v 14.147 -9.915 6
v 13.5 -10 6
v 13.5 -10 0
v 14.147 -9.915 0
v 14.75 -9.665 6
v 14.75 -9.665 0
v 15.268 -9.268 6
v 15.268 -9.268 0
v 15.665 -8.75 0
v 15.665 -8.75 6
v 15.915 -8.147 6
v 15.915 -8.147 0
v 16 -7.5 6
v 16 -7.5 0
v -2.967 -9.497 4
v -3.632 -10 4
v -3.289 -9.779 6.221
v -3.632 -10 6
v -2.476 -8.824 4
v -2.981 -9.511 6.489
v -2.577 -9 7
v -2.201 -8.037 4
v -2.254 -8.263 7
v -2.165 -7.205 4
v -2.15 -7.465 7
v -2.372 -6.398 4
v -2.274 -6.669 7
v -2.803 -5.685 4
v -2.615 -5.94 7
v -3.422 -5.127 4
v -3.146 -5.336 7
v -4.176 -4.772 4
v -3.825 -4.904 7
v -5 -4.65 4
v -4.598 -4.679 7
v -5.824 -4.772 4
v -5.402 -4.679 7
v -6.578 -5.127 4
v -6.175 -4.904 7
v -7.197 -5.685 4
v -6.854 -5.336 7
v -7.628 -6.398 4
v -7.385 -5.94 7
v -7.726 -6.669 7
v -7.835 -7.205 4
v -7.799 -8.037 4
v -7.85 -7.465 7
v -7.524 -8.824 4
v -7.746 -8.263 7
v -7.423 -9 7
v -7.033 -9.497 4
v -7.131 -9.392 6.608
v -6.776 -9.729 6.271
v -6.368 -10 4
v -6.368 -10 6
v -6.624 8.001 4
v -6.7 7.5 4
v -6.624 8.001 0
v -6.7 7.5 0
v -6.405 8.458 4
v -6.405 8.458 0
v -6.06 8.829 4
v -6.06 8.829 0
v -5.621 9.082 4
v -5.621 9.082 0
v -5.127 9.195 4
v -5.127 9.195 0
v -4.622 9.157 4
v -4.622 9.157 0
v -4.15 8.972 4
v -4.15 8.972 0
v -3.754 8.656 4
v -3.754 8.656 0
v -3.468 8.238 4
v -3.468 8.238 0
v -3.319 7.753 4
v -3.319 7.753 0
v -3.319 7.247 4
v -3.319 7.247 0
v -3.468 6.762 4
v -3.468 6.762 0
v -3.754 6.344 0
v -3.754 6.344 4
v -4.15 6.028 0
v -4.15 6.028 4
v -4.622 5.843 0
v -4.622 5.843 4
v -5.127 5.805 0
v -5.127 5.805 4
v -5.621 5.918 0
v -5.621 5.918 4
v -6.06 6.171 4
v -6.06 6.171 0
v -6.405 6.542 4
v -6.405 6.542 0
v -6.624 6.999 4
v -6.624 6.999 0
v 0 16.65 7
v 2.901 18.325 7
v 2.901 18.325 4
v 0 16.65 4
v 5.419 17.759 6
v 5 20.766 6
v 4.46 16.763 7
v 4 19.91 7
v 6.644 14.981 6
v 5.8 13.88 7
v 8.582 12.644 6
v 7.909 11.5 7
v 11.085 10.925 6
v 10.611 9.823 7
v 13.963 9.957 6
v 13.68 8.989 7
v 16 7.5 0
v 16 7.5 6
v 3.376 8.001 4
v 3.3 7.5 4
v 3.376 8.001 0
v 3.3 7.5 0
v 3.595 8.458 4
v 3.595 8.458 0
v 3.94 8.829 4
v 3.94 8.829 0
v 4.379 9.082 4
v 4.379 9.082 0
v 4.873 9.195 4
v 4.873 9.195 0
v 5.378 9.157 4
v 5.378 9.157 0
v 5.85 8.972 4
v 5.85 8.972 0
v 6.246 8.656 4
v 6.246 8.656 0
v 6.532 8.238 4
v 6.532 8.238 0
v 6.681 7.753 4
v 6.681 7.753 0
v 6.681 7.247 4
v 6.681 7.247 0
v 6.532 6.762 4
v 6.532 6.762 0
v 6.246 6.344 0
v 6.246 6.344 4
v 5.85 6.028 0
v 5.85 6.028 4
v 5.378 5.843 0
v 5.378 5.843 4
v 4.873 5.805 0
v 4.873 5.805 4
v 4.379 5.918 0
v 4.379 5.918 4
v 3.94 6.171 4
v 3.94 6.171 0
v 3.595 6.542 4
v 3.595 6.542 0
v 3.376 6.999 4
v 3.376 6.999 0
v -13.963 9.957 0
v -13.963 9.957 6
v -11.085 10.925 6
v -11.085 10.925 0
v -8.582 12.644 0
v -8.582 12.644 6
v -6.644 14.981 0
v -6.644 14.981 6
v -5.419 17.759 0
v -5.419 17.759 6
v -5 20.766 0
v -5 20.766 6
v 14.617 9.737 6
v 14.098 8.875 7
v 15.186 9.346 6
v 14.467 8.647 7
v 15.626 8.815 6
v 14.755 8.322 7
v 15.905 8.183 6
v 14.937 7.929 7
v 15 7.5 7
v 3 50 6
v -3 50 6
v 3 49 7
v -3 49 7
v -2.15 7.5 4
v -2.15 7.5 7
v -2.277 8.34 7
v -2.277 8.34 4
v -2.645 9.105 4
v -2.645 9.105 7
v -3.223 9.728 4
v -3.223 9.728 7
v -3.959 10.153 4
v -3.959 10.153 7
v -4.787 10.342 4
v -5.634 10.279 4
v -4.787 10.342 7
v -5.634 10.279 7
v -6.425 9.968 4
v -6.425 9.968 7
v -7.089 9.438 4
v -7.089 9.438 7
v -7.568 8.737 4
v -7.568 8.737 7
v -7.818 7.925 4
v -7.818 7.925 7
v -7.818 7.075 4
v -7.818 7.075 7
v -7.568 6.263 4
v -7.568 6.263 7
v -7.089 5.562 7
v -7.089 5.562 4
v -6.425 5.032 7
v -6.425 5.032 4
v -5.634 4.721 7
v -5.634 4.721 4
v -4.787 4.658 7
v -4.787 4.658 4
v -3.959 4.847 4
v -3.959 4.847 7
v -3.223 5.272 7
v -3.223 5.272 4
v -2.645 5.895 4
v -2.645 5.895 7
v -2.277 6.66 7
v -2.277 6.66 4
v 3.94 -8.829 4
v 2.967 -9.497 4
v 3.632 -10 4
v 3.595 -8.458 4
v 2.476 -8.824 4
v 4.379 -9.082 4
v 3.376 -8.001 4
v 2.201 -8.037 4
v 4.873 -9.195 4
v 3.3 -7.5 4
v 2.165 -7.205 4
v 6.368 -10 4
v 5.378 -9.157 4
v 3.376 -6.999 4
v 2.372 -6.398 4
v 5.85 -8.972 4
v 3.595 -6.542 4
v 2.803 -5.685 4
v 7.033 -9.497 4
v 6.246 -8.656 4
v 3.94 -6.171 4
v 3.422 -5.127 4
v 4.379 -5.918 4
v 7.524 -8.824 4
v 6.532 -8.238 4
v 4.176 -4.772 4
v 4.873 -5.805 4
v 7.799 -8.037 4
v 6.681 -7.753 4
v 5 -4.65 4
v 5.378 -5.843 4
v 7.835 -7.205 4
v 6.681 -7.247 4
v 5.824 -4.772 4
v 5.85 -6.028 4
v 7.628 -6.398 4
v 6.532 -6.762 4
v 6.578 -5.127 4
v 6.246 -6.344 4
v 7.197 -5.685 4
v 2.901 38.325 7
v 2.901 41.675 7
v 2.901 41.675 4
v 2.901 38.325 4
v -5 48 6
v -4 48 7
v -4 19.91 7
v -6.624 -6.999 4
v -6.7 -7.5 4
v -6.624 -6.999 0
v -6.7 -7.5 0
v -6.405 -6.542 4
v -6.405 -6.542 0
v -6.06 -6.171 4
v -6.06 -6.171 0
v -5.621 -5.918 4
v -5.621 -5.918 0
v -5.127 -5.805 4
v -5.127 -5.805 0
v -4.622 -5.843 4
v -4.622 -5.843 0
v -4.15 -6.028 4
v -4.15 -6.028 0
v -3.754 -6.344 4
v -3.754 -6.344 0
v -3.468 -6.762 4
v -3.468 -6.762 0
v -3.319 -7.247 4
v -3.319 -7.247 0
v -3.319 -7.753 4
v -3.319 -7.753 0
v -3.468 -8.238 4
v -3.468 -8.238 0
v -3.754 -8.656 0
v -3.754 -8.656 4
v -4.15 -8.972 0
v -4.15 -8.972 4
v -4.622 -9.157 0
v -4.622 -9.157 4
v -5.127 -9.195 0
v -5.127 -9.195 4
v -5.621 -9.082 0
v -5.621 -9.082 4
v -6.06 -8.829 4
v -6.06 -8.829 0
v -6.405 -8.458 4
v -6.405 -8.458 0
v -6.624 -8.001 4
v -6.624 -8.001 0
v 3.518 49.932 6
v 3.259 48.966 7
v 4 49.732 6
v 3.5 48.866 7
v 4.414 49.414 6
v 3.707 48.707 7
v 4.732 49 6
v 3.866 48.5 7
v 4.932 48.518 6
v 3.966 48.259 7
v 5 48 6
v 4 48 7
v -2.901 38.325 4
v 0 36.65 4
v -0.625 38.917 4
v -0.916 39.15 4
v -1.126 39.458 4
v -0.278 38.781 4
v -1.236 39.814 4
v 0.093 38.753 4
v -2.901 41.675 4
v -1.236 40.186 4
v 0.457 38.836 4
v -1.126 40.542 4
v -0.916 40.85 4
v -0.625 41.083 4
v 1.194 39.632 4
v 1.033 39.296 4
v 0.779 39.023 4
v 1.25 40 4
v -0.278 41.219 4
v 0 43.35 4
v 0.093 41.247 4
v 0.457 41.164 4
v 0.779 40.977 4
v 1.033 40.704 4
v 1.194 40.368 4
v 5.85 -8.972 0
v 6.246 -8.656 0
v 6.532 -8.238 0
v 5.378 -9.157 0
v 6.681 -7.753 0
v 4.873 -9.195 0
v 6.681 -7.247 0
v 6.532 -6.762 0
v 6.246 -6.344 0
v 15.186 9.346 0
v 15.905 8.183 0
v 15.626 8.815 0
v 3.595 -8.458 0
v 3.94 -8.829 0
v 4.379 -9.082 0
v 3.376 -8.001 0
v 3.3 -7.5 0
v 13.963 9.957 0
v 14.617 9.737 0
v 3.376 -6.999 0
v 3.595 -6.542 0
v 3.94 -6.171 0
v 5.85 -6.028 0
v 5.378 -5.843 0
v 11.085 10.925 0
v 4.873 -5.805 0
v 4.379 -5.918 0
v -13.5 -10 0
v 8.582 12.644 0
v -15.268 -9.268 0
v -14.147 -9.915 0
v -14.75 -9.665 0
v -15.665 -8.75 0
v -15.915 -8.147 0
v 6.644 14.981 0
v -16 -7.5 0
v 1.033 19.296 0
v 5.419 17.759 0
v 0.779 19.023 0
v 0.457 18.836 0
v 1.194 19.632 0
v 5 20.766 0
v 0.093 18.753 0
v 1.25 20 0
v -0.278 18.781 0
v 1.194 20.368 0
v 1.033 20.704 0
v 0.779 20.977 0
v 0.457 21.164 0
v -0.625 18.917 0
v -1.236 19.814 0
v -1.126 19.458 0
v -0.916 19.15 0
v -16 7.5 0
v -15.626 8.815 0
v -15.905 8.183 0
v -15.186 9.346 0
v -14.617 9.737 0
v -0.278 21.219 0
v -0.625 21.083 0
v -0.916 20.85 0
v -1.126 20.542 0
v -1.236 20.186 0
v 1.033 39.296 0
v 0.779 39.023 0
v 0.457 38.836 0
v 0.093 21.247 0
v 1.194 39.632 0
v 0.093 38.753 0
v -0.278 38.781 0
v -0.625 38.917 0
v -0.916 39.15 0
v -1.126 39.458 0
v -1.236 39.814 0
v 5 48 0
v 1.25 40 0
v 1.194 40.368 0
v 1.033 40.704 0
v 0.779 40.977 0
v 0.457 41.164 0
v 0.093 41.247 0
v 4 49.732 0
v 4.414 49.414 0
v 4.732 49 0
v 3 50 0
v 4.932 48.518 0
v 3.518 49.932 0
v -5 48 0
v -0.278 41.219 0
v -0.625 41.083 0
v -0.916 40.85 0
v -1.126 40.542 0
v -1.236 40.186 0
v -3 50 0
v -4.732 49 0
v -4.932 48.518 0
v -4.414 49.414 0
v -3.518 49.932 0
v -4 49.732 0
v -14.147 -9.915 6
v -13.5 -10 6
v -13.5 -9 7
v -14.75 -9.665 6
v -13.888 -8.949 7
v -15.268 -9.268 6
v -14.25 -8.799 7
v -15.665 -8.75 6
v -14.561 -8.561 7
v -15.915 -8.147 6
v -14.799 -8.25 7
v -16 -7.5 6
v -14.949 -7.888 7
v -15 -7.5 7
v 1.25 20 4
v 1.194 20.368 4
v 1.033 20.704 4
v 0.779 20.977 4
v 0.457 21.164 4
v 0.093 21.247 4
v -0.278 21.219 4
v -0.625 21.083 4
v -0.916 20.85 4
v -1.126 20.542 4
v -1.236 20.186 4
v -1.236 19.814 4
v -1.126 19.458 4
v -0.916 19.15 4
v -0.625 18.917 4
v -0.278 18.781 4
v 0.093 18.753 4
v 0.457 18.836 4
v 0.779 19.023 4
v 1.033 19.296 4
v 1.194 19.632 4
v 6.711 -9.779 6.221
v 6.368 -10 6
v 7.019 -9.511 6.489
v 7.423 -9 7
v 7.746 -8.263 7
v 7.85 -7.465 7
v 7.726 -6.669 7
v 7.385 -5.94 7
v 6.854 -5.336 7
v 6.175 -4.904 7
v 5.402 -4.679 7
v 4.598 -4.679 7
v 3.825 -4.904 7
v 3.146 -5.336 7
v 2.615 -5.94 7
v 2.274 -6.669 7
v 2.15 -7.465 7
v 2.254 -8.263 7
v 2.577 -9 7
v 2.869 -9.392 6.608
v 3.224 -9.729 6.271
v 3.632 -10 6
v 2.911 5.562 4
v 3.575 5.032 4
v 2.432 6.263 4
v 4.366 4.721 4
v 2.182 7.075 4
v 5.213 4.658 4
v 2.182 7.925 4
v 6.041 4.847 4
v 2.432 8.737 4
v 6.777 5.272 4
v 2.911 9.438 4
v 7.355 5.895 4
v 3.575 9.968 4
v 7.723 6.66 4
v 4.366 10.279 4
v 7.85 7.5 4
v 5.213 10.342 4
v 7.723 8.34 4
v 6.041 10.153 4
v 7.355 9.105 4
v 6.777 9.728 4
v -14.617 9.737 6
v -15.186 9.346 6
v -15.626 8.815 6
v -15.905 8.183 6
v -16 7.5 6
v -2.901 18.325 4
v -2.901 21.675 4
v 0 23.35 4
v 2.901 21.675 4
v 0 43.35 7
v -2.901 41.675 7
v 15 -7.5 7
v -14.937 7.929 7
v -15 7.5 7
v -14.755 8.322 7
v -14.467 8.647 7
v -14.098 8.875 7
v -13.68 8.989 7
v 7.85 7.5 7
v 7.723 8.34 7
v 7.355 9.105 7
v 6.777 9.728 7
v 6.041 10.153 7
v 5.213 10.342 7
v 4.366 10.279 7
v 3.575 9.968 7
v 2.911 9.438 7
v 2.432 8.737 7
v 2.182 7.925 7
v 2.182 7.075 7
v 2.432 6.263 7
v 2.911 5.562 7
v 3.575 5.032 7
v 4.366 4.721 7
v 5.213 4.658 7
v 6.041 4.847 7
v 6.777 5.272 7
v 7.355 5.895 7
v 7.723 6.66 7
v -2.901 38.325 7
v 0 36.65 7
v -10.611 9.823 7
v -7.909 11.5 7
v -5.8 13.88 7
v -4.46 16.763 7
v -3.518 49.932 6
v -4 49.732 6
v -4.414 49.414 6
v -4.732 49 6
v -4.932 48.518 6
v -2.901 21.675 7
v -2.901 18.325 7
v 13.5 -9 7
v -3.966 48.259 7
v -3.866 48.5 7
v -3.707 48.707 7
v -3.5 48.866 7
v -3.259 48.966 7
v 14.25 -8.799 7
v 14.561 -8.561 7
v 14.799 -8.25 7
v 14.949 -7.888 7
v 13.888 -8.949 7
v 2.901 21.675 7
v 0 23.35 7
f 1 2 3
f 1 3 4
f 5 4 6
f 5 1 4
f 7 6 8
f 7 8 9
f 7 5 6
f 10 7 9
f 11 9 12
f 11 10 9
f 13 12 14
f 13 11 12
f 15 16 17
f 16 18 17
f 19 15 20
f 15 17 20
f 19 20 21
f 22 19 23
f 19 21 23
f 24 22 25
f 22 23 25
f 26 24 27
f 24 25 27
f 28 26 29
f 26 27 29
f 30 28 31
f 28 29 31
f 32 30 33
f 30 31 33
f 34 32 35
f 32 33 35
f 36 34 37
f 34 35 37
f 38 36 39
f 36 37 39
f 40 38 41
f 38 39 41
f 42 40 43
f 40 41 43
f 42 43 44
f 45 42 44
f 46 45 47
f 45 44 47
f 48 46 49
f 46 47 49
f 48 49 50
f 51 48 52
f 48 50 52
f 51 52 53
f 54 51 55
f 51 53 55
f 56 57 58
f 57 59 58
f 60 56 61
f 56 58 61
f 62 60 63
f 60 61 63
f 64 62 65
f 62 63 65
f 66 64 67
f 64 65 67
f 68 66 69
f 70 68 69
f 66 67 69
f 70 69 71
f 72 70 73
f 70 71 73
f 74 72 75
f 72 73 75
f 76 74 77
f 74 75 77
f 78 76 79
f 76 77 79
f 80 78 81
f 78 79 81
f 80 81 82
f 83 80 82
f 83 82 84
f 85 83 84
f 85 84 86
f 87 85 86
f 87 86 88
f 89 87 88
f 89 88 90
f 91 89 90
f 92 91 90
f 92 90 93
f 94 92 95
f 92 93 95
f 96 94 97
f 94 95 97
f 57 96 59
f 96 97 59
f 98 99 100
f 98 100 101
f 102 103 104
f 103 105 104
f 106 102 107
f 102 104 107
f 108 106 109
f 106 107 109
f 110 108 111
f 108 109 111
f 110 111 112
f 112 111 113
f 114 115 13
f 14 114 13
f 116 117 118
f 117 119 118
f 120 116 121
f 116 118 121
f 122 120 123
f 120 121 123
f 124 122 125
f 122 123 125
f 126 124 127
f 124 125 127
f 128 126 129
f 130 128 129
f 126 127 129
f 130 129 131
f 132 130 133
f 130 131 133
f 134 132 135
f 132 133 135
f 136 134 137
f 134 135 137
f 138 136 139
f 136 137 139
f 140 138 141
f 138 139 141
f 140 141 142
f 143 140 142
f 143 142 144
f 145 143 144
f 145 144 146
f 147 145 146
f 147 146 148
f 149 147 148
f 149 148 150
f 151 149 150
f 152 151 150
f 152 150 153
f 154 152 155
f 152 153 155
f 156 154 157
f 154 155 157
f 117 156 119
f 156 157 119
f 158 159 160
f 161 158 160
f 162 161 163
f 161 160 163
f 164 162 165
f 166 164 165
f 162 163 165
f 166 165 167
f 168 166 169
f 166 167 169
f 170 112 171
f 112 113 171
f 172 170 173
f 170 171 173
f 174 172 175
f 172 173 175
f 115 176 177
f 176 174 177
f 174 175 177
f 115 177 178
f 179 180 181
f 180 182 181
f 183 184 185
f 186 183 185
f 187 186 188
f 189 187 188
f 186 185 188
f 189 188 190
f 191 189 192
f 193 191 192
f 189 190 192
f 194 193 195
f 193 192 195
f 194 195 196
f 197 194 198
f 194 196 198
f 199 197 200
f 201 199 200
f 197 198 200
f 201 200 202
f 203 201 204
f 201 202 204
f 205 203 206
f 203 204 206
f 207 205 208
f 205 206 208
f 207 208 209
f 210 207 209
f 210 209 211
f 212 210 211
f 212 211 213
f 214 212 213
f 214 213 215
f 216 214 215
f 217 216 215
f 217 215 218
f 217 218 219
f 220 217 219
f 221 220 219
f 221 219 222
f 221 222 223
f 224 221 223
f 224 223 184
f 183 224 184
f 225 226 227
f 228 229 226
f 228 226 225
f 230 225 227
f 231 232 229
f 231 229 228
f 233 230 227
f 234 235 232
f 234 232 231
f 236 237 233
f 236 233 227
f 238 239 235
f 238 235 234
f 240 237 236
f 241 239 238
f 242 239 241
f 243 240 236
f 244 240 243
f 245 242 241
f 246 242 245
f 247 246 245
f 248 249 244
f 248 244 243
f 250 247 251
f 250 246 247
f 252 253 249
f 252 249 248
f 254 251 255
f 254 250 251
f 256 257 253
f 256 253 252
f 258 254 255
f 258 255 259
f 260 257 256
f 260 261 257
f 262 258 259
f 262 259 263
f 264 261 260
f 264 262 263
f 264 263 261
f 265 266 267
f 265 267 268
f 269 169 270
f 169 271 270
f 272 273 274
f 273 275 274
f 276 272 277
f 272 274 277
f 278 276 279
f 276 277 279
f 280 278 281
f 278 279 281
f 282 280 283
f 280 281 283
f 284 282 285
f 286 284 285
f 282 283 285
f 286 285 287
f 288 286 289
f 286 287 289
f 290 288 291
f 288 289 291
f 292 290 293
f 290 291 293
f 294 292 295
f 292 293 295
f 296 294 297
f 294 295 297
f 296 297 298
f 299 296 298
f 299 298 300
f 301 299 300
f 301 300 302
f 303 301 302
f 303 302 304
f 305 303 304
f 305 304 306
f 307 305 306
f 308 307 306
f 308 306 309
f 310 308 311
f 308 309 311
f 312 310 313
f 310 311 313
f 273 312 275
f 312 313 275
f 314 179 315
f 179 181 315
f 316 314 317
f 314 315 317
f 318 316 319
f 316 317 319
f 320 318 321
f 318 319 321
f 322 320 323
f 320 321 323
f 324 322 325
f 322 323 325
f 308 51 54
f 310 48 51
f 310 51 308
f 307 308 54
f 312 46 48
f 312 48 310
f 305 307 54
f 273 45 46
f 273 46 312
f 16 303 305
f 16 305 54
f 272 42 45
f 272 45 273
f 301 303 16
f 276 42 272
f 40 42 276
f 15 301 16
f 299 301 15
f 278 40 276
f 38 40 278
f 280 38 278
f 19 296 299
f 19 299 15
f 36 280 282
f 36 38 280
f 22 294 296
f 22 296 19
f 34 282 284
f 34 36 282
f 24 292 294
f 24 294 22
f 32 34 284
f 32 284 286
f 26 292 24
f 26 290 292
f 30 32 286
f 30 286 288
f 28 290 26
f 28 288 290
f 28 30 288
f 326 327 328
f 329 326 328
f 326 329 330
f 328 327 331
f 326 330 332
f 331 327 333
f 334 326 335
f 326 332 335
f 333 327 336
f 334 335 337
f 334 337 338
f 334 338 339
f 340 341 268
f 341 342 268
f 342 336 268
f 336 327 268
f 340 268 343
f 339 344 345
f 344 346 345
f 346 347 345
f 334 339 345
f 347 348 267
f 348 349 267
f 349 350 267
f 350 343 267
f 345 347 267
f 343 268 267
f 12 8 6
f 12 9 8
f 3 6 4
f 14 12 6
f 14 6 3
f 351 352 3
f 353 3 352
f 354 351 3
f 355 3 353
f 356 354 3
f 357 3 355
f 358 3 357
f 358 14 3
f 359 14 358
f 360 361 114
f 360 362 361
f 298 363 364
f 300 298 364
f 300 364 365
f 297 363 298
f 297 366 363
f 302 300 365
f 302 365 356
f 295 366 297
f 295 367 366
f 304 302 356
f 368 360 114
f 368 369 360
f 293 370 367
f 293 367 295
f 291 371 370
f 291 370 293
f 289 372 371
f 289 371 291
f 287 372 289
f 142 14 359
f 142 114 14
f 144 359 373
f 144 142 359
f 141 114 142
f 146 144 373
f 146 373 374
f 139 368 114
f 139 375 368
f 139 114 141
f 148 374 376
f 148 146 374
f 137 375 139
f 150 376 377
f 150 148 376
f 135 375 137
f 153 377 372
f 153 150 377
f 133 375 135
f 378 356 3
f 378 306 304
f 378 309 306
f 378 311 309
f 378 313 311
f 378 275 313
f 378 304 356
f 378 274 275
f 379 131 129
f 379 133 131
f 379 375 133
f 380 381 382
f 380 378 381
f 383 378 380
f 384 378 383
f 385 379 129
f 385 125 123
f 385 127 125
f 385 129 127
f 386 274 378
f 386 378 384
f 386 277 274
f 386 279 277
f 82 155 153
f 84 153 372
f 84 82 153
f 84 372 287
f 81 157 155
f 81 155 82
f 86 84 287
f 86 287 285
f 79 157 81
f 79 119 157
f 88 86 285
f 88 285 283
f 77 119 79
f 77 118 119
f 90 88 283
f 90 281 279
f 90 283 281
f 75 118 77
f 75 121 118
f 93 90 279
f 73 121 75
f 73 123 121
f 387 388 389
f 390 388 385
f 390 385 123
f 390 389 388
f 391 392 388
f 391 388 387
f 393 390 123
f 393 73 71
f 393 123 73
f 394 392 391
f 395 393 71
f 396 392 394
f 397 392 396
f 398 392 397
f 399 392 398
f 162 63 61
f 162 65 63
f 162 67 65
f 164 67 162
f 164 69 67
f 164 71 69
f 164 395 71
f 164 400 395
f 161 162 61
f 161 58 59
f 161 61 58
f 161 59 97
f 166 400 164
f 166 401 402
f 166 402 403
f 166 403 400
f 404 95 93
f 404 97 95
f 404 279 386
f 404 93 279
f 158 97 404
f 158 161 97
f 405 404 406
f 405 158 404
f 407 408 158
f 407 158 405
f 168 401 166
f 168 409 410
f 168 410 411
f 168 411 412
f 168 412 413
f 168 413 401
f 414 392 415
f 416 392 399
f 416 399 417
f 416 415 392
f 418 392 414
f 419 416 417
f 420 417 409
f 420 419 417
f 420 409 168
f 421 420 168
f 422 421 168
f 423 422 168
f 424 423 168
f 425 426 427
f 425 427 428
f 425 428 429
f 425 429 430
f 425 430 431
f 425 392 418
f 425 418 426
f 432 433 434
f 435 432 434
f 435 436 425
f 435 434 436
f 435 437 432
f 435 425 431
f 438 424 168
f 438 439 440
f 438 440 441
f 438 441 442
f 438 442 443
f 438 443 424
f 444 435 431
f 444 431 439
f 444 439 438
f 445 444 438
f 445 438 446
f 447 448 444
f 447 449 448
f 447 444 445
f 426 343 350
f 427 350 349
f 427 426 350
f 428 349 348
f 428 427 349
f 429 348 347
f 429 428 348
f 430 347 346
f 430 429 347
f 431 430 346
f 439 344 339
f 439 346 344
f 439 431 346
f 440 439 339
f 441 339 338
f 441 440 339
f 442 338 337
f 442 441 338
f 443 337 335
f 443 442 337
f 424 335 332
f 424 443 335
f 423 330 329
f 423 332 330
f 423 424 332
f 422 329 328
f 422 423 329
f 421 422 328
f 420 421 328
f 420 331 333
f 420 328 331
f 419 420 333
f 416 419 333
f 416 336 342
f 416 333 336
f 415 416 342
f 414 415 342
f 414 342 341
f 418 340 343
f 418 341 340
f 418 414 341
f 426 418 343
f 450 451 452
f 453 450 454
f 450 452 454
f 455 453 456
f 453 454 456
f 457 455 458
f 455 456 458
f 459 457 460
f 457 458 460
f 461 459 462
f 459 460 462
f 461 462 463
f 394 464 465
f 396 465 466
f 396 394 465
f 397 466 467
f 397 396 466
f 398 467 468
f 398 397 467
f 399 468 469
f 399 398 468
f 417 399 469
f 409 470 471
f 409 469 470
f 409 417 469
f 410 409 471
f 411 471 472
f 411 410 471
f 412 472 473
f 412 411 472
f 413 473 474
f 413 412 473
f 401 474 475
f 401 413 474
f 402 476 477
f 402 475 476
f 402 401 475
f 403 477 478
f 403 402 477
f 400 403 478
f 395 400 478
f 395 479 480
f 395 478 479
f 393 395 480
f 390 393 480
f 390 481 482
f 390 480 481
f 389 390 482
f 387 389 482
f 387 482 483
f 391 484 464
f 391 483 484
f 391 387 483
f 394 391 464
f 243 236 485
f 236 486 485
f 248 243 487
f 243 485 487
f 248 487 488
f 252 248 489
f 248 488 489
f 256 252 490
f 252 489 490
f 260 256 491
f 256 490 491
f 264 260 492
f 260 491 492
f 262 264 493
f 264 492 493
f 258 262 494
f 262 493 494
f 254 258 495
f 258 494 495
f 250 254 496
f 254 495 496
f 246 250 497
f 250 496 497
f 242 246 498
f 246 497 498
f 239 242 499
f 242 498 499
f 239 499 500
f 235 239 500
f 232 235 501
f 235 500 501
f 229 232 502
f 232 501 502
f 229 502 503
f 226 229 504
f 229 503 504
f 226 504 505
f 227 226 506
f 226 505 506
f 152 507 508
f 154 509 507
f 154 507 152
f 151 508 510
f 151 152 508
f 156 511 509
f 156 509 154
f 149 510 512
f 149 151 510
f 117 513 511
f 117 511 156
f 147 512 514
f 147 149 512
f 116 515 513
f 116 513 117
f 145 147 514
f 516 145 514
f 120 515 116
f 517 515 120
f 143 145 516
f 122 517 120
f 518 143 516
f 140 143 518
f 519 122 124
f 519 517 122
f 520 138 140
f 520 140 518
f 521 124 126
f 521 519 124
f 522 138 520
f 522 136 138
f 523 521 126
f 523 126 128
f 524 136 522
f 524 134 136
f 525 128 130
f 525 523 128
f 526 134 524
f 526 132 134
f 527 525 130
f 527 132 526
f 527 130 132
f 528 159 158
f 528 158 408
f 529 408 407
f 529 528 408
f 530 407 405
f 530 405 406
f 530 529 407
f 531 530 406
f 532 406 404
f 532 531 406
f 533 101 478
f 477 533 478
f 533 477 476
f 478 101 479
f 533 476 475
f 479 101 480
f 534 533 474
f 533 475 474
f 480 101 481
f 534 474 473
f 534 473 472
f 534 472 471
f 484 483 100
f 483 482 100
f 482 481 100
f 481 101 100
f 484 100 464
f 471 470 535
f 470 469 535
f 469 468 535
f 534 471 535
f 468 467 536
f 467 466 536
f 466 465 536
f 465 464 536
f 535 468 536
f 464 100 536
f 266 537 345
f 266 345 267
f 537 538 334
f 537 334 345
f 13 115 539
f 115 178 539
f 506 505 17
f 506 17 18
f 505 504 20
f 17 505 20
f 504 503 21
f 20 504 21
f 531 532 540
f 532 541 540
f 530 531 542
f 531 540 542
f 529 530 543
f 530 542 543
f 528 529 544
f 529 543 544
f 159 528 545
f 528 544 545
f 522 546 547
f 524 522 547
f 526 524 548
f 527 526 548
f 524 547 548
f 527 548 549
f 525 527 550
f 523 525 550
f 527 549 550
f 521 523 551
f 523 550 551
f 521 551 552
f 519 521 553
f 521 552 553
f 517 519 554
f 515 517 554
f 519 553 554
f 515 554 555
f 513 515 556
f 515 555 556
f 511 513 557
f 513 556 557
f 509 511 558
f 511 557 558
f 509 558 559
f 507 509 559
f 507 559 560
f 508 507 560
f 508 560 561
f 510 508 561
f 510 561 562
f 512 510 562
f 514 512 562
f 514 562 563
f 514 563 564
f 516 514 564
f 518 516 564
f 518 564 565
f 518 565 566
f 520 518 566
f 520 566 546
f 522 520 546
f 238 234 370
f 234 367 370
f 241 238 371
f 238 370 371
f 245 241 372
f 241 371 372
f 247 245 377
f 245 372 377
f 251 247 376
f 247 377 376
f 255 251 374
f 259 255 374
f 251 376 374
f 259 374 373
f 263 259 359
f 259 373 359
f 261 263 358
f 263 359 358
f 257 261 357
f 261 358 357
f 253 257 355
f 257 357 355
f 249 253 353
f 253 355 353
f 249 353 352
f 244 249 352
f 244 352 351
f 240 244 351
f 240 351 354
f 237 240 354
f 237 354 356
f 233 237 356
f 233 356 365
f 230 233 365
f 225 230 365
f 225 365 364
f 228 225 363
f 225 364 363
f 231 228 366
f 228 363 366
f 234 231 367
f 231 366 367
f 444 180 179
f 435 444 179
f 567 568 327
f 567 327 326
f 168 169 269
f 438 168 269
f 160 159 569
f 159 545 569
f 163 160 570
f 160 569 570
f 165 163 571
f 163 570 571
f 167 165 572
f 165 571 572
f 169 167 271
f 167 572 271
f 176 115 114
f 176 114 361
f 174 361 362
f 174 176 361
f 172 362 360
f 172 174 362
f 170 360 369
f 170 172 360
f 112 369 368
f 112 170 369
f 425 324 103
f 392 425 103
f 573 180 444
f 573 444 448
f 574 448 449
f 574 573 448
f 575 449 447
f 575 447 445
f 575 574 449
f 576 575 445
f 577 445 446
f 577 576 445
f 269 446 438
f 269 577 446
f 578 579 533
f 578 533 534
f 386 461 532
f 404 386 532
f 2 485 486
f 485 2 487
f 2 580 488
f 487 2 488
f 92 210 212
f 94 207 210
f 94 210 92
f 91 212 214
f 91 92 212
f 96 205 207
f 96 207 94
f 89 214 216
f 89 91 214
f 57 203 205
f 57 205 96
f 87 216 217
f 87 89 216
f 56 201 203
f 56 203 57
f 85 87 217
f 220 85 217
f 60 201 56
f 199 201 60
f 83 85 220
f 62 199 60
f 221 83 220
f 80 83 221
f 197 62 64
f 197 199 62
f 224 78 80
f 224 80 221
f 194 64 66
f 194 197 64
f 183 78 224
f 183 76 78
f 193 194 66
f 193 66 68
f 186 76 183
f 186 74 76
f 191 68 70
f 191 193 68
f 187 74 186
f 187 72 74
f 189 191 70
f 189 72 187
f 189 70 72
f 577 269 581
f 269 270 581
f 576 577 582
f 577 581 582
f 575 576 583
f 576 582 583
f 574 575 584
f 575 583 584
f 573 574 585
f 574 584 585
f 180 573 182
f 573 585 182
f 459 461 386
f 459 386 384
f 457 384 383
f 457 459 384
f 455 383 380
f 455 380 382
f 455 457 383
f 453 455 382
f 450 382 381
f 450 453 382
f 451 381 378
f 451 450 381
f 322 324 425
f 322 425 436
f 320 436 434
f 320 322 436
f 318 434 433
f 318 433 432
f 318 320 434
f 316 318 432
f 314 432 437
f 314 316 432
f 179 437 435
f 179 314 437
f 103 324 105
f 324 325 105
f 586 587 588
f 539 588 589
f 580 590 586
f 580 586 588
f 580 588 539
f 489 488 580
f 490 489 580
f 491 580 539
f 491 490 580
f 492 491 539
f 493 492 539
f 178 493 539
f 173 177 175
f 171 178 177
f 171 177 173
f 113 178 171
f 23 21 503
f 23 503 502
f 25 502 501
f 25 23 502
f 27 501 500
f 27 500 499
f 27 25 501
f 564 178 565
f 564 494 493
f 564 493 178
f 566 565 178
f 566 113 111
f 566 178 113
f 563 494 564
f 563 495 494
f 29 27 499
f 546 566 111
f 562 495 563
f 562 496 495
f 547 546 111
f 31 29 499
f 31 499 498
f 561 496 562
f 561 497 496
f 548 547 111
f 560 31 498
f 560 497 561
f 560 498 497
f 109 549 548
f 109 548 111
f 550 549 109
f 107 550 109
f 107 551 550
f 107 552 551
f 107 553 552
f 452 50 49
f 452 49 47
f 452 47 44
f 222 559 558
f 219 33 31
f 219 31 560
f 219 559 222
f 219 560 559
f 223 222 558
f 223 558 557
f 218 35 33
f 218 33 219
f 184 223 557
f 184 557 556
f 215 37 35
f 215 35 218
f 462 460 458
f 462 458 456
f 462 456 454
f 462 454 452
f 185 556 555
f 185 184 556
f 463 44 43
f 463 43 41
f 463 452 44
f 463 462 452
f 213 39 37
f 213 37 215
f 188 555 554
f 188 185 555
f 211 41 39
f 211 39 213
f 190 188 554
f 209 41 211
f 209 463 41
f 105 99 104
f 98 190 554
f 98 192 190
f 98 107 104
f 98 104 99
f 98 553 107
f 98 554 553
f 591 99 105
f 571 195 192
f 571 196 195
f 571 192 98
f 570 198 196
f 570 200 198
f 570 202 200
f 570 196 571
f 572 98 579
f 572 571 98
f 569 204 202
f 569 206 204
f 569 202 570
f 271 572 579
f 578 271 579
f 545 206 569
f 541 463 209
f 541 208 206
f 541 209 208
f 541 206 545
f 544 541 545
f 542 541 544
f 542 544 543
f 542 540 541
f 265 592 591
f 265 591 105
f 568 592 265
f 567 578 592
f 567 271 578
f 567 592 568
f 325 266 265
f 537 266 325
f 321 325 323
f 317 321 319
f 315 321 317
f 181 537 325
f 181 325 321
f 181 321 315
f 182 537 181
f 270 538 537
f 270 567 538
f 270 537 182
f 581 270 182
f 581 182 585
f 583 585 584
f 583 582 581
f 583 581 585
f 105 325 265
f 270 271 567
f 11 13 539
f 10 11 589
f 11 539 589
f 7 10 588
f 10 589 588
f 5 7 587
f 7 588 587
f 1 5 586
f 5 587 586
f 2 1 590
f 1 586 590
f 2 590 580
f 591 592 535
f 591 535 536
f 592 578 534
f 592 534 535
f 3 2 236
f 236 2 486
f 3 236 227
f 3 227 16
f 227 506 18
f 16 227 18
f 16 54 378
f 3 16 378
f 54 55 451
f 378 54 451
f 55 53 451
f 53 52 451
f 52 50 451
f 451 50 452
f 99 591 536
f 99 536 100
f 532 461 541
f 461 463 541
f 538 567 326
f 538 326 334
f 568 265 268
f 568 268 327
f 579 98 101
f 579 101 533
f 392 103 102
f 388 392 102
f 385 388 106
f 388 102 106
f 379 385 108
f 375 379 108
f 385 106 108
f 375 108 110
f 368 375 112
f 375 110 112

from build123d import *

# Parameters (mm, degrees)
PAD006_DEPTH     = 0.2
PRISM003_DEPTH   = 4
PRISM004_DEPTH   = 4
PAD_DEPTH        = 6
HOLE_D           = 3.4
HOLE_DEPTH       = 25
HOLE_CBORE_D     = 5.7
HOLE_CBORE_DEPTH = 3
SKETCH004_R      = 1.25
HOLE001_DEPTH    = 25


with BuildPart() as railnutholes:
    # Sketch009 → Pad006 (new body)
    with BuildSketch(Plane.XY.offset(8)):
        with BuildLine():
            ThreePointArc((1.5, 40), (0, 41.5), (-1.5, 40))
            Line((-1.5, 40), (-1.5, 20))
            ThreePointArc((-1.5, 20), (0, 18.5), (1.5, 20))
            Line((1.5, 20), (1.5, 40))
        make_face()
    extrude(amount=PAD006_DEPTH)

    # Prism003 → Prism003 (join)
    with BuildSketch(Plane(origin=(0, 20, 8), x_dir=(0, 1, 0), z_dir=(0, 0, -1))):
        Polygon((3.35, 0), (1.675, 2.901185), (-1.675, 2.901185), (-3.35, 0), (-1.675, -2.901185), (1.675, -2.901185), align=None)
    extrude(amount=PRISM003_DEPTH)

    # Prism004 → Prism004 (join)
    with BuildSketch(Plane(origin=(0, 40, 8), x_dir=(0, 1, 0), z_dir=(0, 0, -1))):
        Polygon((3.35, 0), (1.675, 2.901185), (-1.675, 2.901185), (-3.35, 0), (-1.675, -2.901185), (1.675, -2.901185), align=None)
    extrude(amount=PRISM004_DEPTH)


with BuildPart() as carriagebasemain:
    # Sketch → Pad (new body)
    with BuildSketch(Plane.XY.offset(6)):
        with BuildLine():
            Line((-16, -7.5), (-16, 7.5))
            ThreePointArc((-13.962963, 9.956759), (-15.424501, 9.095712), (-16, 7.5))
            ThreePointArc((-13.962963, 9.956759), (-7.532196, 13.745367), (-5, 20.766499))
            Line((-5, 20.766499), (-5, 48))
            ThreePointArc((-3, 50), (-4.414214, 49.414214), (-5, 48))
            Line((-3, 50), (3, 50))
            ThreePointArc((5, 48), (4.414214, 49.414214), (3, 50))
            Line((5, 48), (5, 20.766499))
            ThreePointArc((5, 20.766499), (7.532196, 13.745367), (13.962963, 9.956759))
            ThreePointArc((16, 7.5), (15.424501, 9.095712), (13.962963, 9.956759))
            Line((16, 7.5), (16, -7.5))
            ThreePointArc((13.5, -10), (15.267767, -9.267767), (16, -7.5))
            Line((13.5, -10), (-13.5, -10))
            ThreePointArc((-16, -7.5), (-15.267767, -9.267767), (-13.5, -10))
        make_face()
    extrude(amount=-PAD_DEPTH)

    # Sketch → AdditiveLoft section 0
    with BuildSketch(Plane.XY.offset(6)):
        with BuildLine():
            Line((-16, -7.5), (-16, 7.5))
            ThreePointArc((-13.962963, 9.956759), (-15.424501, 9.095712), (-16, 7.5))
            ThreePointArc((-13.962963, 9.956759), (-7.532196, 13.745367), (-5, 20.766499))
            Line((-5, 20.766499), (-5, 48))
            ThreePointArc((-3, 50), (-4.414214, 49.414214), (-5, 48))
            Line((-3, 50), (3, 50))
            ThreePointArc((5, 48), (4.414214, 49.414214), (3, 50))
            Line((5, 48), (5, 20.766499))
            ThreePointArc((5, 20.766499), (7.532196, 13.745367), (13.962963, 9.956759))
            ThreePointArc((16, 7.5), (15.424501, 9.095712), (13.962963, 9.956759))
            Line((16, 7.5), (16, -7.5))
            ThreePointArc((13.5, -10), (15.267767, -9.267767), (16, -7.5))
            Line((13.5, -10), (-13.5, -10))
            ThreePointArc((-16, -7.5), (-15.267767, -9.267767), (-13.5, -10))
        make_face()
    # Sketch001 → AdditiveLoft section 1
    with BuildSketch(Plane.XY.offset(7)):
        with BuildLine():
            Line((-15, -7.5), (-15, 7.5))
            ThreePointArc((-13.68, 8.989161), (-14.622497, 8.494987), (-15, 7.5))
            ThreePointArc((-13.68, 8.989161), (-6.768354, 12.613099), (-4, 19.909674))
            Line((-4, 19.909674), (-4, 48))
            ThreePointArc((-3, 49), (-3.707107, 48.707107), (-4, 48))
            Line((-3, 49), (3, 49))
            ThreePointArc((4, 48), (3.707107, 48.707107), (3, 49))
            Line((4, 48), (4, 19.909674))
            ThreePointArc((4, 19.909674), (6.768354, 12.613099), (13.68, 8.989161))
            ThreePointArc((15, 7.5), (14.622497, 8.494987), (13.68, 8.989161))
            Line((15, 7.5), (15, -7.5))
            ThreePointArc((13.5, -9), (14.56066, -8.56066), (15, -7.5))
            Line((13.5, -9), (-13.5, -9))
            ThreePointArc((-15, -7.5), (-14.56066, -8.56066), (-13.5, -9))
        make_face()
    loft()

    # Hole
    with Locations(Plane.XY.offset(7)):
        with Locations((-5, 7.5), (5, 7.5), (-5, -7.5), (5, -7.5)):
            CounterBoreHole(HOLE_D / 2, HOLE_CBORE_D / 2, HOLE_CBORE_DEPTH, depth=HOLE_DEPTH)

    # Sketch004 → Hole001 (cut)
    with BuildSketch(Plane.XY):
        with Locations((0, 20)):
            Circle(SKETCH004_R)
        with Locations((0, 40)):
            Circle(SKETCH004_R)
    extrude(amount=HOLE001_DEPTH, mode=Mode.SUBTRACT)

    # Boolean: cut RailNutHoles
    add(railnutholes.part, mode=Mode.SUBTRACT)


solid = carriagebasemain.part
